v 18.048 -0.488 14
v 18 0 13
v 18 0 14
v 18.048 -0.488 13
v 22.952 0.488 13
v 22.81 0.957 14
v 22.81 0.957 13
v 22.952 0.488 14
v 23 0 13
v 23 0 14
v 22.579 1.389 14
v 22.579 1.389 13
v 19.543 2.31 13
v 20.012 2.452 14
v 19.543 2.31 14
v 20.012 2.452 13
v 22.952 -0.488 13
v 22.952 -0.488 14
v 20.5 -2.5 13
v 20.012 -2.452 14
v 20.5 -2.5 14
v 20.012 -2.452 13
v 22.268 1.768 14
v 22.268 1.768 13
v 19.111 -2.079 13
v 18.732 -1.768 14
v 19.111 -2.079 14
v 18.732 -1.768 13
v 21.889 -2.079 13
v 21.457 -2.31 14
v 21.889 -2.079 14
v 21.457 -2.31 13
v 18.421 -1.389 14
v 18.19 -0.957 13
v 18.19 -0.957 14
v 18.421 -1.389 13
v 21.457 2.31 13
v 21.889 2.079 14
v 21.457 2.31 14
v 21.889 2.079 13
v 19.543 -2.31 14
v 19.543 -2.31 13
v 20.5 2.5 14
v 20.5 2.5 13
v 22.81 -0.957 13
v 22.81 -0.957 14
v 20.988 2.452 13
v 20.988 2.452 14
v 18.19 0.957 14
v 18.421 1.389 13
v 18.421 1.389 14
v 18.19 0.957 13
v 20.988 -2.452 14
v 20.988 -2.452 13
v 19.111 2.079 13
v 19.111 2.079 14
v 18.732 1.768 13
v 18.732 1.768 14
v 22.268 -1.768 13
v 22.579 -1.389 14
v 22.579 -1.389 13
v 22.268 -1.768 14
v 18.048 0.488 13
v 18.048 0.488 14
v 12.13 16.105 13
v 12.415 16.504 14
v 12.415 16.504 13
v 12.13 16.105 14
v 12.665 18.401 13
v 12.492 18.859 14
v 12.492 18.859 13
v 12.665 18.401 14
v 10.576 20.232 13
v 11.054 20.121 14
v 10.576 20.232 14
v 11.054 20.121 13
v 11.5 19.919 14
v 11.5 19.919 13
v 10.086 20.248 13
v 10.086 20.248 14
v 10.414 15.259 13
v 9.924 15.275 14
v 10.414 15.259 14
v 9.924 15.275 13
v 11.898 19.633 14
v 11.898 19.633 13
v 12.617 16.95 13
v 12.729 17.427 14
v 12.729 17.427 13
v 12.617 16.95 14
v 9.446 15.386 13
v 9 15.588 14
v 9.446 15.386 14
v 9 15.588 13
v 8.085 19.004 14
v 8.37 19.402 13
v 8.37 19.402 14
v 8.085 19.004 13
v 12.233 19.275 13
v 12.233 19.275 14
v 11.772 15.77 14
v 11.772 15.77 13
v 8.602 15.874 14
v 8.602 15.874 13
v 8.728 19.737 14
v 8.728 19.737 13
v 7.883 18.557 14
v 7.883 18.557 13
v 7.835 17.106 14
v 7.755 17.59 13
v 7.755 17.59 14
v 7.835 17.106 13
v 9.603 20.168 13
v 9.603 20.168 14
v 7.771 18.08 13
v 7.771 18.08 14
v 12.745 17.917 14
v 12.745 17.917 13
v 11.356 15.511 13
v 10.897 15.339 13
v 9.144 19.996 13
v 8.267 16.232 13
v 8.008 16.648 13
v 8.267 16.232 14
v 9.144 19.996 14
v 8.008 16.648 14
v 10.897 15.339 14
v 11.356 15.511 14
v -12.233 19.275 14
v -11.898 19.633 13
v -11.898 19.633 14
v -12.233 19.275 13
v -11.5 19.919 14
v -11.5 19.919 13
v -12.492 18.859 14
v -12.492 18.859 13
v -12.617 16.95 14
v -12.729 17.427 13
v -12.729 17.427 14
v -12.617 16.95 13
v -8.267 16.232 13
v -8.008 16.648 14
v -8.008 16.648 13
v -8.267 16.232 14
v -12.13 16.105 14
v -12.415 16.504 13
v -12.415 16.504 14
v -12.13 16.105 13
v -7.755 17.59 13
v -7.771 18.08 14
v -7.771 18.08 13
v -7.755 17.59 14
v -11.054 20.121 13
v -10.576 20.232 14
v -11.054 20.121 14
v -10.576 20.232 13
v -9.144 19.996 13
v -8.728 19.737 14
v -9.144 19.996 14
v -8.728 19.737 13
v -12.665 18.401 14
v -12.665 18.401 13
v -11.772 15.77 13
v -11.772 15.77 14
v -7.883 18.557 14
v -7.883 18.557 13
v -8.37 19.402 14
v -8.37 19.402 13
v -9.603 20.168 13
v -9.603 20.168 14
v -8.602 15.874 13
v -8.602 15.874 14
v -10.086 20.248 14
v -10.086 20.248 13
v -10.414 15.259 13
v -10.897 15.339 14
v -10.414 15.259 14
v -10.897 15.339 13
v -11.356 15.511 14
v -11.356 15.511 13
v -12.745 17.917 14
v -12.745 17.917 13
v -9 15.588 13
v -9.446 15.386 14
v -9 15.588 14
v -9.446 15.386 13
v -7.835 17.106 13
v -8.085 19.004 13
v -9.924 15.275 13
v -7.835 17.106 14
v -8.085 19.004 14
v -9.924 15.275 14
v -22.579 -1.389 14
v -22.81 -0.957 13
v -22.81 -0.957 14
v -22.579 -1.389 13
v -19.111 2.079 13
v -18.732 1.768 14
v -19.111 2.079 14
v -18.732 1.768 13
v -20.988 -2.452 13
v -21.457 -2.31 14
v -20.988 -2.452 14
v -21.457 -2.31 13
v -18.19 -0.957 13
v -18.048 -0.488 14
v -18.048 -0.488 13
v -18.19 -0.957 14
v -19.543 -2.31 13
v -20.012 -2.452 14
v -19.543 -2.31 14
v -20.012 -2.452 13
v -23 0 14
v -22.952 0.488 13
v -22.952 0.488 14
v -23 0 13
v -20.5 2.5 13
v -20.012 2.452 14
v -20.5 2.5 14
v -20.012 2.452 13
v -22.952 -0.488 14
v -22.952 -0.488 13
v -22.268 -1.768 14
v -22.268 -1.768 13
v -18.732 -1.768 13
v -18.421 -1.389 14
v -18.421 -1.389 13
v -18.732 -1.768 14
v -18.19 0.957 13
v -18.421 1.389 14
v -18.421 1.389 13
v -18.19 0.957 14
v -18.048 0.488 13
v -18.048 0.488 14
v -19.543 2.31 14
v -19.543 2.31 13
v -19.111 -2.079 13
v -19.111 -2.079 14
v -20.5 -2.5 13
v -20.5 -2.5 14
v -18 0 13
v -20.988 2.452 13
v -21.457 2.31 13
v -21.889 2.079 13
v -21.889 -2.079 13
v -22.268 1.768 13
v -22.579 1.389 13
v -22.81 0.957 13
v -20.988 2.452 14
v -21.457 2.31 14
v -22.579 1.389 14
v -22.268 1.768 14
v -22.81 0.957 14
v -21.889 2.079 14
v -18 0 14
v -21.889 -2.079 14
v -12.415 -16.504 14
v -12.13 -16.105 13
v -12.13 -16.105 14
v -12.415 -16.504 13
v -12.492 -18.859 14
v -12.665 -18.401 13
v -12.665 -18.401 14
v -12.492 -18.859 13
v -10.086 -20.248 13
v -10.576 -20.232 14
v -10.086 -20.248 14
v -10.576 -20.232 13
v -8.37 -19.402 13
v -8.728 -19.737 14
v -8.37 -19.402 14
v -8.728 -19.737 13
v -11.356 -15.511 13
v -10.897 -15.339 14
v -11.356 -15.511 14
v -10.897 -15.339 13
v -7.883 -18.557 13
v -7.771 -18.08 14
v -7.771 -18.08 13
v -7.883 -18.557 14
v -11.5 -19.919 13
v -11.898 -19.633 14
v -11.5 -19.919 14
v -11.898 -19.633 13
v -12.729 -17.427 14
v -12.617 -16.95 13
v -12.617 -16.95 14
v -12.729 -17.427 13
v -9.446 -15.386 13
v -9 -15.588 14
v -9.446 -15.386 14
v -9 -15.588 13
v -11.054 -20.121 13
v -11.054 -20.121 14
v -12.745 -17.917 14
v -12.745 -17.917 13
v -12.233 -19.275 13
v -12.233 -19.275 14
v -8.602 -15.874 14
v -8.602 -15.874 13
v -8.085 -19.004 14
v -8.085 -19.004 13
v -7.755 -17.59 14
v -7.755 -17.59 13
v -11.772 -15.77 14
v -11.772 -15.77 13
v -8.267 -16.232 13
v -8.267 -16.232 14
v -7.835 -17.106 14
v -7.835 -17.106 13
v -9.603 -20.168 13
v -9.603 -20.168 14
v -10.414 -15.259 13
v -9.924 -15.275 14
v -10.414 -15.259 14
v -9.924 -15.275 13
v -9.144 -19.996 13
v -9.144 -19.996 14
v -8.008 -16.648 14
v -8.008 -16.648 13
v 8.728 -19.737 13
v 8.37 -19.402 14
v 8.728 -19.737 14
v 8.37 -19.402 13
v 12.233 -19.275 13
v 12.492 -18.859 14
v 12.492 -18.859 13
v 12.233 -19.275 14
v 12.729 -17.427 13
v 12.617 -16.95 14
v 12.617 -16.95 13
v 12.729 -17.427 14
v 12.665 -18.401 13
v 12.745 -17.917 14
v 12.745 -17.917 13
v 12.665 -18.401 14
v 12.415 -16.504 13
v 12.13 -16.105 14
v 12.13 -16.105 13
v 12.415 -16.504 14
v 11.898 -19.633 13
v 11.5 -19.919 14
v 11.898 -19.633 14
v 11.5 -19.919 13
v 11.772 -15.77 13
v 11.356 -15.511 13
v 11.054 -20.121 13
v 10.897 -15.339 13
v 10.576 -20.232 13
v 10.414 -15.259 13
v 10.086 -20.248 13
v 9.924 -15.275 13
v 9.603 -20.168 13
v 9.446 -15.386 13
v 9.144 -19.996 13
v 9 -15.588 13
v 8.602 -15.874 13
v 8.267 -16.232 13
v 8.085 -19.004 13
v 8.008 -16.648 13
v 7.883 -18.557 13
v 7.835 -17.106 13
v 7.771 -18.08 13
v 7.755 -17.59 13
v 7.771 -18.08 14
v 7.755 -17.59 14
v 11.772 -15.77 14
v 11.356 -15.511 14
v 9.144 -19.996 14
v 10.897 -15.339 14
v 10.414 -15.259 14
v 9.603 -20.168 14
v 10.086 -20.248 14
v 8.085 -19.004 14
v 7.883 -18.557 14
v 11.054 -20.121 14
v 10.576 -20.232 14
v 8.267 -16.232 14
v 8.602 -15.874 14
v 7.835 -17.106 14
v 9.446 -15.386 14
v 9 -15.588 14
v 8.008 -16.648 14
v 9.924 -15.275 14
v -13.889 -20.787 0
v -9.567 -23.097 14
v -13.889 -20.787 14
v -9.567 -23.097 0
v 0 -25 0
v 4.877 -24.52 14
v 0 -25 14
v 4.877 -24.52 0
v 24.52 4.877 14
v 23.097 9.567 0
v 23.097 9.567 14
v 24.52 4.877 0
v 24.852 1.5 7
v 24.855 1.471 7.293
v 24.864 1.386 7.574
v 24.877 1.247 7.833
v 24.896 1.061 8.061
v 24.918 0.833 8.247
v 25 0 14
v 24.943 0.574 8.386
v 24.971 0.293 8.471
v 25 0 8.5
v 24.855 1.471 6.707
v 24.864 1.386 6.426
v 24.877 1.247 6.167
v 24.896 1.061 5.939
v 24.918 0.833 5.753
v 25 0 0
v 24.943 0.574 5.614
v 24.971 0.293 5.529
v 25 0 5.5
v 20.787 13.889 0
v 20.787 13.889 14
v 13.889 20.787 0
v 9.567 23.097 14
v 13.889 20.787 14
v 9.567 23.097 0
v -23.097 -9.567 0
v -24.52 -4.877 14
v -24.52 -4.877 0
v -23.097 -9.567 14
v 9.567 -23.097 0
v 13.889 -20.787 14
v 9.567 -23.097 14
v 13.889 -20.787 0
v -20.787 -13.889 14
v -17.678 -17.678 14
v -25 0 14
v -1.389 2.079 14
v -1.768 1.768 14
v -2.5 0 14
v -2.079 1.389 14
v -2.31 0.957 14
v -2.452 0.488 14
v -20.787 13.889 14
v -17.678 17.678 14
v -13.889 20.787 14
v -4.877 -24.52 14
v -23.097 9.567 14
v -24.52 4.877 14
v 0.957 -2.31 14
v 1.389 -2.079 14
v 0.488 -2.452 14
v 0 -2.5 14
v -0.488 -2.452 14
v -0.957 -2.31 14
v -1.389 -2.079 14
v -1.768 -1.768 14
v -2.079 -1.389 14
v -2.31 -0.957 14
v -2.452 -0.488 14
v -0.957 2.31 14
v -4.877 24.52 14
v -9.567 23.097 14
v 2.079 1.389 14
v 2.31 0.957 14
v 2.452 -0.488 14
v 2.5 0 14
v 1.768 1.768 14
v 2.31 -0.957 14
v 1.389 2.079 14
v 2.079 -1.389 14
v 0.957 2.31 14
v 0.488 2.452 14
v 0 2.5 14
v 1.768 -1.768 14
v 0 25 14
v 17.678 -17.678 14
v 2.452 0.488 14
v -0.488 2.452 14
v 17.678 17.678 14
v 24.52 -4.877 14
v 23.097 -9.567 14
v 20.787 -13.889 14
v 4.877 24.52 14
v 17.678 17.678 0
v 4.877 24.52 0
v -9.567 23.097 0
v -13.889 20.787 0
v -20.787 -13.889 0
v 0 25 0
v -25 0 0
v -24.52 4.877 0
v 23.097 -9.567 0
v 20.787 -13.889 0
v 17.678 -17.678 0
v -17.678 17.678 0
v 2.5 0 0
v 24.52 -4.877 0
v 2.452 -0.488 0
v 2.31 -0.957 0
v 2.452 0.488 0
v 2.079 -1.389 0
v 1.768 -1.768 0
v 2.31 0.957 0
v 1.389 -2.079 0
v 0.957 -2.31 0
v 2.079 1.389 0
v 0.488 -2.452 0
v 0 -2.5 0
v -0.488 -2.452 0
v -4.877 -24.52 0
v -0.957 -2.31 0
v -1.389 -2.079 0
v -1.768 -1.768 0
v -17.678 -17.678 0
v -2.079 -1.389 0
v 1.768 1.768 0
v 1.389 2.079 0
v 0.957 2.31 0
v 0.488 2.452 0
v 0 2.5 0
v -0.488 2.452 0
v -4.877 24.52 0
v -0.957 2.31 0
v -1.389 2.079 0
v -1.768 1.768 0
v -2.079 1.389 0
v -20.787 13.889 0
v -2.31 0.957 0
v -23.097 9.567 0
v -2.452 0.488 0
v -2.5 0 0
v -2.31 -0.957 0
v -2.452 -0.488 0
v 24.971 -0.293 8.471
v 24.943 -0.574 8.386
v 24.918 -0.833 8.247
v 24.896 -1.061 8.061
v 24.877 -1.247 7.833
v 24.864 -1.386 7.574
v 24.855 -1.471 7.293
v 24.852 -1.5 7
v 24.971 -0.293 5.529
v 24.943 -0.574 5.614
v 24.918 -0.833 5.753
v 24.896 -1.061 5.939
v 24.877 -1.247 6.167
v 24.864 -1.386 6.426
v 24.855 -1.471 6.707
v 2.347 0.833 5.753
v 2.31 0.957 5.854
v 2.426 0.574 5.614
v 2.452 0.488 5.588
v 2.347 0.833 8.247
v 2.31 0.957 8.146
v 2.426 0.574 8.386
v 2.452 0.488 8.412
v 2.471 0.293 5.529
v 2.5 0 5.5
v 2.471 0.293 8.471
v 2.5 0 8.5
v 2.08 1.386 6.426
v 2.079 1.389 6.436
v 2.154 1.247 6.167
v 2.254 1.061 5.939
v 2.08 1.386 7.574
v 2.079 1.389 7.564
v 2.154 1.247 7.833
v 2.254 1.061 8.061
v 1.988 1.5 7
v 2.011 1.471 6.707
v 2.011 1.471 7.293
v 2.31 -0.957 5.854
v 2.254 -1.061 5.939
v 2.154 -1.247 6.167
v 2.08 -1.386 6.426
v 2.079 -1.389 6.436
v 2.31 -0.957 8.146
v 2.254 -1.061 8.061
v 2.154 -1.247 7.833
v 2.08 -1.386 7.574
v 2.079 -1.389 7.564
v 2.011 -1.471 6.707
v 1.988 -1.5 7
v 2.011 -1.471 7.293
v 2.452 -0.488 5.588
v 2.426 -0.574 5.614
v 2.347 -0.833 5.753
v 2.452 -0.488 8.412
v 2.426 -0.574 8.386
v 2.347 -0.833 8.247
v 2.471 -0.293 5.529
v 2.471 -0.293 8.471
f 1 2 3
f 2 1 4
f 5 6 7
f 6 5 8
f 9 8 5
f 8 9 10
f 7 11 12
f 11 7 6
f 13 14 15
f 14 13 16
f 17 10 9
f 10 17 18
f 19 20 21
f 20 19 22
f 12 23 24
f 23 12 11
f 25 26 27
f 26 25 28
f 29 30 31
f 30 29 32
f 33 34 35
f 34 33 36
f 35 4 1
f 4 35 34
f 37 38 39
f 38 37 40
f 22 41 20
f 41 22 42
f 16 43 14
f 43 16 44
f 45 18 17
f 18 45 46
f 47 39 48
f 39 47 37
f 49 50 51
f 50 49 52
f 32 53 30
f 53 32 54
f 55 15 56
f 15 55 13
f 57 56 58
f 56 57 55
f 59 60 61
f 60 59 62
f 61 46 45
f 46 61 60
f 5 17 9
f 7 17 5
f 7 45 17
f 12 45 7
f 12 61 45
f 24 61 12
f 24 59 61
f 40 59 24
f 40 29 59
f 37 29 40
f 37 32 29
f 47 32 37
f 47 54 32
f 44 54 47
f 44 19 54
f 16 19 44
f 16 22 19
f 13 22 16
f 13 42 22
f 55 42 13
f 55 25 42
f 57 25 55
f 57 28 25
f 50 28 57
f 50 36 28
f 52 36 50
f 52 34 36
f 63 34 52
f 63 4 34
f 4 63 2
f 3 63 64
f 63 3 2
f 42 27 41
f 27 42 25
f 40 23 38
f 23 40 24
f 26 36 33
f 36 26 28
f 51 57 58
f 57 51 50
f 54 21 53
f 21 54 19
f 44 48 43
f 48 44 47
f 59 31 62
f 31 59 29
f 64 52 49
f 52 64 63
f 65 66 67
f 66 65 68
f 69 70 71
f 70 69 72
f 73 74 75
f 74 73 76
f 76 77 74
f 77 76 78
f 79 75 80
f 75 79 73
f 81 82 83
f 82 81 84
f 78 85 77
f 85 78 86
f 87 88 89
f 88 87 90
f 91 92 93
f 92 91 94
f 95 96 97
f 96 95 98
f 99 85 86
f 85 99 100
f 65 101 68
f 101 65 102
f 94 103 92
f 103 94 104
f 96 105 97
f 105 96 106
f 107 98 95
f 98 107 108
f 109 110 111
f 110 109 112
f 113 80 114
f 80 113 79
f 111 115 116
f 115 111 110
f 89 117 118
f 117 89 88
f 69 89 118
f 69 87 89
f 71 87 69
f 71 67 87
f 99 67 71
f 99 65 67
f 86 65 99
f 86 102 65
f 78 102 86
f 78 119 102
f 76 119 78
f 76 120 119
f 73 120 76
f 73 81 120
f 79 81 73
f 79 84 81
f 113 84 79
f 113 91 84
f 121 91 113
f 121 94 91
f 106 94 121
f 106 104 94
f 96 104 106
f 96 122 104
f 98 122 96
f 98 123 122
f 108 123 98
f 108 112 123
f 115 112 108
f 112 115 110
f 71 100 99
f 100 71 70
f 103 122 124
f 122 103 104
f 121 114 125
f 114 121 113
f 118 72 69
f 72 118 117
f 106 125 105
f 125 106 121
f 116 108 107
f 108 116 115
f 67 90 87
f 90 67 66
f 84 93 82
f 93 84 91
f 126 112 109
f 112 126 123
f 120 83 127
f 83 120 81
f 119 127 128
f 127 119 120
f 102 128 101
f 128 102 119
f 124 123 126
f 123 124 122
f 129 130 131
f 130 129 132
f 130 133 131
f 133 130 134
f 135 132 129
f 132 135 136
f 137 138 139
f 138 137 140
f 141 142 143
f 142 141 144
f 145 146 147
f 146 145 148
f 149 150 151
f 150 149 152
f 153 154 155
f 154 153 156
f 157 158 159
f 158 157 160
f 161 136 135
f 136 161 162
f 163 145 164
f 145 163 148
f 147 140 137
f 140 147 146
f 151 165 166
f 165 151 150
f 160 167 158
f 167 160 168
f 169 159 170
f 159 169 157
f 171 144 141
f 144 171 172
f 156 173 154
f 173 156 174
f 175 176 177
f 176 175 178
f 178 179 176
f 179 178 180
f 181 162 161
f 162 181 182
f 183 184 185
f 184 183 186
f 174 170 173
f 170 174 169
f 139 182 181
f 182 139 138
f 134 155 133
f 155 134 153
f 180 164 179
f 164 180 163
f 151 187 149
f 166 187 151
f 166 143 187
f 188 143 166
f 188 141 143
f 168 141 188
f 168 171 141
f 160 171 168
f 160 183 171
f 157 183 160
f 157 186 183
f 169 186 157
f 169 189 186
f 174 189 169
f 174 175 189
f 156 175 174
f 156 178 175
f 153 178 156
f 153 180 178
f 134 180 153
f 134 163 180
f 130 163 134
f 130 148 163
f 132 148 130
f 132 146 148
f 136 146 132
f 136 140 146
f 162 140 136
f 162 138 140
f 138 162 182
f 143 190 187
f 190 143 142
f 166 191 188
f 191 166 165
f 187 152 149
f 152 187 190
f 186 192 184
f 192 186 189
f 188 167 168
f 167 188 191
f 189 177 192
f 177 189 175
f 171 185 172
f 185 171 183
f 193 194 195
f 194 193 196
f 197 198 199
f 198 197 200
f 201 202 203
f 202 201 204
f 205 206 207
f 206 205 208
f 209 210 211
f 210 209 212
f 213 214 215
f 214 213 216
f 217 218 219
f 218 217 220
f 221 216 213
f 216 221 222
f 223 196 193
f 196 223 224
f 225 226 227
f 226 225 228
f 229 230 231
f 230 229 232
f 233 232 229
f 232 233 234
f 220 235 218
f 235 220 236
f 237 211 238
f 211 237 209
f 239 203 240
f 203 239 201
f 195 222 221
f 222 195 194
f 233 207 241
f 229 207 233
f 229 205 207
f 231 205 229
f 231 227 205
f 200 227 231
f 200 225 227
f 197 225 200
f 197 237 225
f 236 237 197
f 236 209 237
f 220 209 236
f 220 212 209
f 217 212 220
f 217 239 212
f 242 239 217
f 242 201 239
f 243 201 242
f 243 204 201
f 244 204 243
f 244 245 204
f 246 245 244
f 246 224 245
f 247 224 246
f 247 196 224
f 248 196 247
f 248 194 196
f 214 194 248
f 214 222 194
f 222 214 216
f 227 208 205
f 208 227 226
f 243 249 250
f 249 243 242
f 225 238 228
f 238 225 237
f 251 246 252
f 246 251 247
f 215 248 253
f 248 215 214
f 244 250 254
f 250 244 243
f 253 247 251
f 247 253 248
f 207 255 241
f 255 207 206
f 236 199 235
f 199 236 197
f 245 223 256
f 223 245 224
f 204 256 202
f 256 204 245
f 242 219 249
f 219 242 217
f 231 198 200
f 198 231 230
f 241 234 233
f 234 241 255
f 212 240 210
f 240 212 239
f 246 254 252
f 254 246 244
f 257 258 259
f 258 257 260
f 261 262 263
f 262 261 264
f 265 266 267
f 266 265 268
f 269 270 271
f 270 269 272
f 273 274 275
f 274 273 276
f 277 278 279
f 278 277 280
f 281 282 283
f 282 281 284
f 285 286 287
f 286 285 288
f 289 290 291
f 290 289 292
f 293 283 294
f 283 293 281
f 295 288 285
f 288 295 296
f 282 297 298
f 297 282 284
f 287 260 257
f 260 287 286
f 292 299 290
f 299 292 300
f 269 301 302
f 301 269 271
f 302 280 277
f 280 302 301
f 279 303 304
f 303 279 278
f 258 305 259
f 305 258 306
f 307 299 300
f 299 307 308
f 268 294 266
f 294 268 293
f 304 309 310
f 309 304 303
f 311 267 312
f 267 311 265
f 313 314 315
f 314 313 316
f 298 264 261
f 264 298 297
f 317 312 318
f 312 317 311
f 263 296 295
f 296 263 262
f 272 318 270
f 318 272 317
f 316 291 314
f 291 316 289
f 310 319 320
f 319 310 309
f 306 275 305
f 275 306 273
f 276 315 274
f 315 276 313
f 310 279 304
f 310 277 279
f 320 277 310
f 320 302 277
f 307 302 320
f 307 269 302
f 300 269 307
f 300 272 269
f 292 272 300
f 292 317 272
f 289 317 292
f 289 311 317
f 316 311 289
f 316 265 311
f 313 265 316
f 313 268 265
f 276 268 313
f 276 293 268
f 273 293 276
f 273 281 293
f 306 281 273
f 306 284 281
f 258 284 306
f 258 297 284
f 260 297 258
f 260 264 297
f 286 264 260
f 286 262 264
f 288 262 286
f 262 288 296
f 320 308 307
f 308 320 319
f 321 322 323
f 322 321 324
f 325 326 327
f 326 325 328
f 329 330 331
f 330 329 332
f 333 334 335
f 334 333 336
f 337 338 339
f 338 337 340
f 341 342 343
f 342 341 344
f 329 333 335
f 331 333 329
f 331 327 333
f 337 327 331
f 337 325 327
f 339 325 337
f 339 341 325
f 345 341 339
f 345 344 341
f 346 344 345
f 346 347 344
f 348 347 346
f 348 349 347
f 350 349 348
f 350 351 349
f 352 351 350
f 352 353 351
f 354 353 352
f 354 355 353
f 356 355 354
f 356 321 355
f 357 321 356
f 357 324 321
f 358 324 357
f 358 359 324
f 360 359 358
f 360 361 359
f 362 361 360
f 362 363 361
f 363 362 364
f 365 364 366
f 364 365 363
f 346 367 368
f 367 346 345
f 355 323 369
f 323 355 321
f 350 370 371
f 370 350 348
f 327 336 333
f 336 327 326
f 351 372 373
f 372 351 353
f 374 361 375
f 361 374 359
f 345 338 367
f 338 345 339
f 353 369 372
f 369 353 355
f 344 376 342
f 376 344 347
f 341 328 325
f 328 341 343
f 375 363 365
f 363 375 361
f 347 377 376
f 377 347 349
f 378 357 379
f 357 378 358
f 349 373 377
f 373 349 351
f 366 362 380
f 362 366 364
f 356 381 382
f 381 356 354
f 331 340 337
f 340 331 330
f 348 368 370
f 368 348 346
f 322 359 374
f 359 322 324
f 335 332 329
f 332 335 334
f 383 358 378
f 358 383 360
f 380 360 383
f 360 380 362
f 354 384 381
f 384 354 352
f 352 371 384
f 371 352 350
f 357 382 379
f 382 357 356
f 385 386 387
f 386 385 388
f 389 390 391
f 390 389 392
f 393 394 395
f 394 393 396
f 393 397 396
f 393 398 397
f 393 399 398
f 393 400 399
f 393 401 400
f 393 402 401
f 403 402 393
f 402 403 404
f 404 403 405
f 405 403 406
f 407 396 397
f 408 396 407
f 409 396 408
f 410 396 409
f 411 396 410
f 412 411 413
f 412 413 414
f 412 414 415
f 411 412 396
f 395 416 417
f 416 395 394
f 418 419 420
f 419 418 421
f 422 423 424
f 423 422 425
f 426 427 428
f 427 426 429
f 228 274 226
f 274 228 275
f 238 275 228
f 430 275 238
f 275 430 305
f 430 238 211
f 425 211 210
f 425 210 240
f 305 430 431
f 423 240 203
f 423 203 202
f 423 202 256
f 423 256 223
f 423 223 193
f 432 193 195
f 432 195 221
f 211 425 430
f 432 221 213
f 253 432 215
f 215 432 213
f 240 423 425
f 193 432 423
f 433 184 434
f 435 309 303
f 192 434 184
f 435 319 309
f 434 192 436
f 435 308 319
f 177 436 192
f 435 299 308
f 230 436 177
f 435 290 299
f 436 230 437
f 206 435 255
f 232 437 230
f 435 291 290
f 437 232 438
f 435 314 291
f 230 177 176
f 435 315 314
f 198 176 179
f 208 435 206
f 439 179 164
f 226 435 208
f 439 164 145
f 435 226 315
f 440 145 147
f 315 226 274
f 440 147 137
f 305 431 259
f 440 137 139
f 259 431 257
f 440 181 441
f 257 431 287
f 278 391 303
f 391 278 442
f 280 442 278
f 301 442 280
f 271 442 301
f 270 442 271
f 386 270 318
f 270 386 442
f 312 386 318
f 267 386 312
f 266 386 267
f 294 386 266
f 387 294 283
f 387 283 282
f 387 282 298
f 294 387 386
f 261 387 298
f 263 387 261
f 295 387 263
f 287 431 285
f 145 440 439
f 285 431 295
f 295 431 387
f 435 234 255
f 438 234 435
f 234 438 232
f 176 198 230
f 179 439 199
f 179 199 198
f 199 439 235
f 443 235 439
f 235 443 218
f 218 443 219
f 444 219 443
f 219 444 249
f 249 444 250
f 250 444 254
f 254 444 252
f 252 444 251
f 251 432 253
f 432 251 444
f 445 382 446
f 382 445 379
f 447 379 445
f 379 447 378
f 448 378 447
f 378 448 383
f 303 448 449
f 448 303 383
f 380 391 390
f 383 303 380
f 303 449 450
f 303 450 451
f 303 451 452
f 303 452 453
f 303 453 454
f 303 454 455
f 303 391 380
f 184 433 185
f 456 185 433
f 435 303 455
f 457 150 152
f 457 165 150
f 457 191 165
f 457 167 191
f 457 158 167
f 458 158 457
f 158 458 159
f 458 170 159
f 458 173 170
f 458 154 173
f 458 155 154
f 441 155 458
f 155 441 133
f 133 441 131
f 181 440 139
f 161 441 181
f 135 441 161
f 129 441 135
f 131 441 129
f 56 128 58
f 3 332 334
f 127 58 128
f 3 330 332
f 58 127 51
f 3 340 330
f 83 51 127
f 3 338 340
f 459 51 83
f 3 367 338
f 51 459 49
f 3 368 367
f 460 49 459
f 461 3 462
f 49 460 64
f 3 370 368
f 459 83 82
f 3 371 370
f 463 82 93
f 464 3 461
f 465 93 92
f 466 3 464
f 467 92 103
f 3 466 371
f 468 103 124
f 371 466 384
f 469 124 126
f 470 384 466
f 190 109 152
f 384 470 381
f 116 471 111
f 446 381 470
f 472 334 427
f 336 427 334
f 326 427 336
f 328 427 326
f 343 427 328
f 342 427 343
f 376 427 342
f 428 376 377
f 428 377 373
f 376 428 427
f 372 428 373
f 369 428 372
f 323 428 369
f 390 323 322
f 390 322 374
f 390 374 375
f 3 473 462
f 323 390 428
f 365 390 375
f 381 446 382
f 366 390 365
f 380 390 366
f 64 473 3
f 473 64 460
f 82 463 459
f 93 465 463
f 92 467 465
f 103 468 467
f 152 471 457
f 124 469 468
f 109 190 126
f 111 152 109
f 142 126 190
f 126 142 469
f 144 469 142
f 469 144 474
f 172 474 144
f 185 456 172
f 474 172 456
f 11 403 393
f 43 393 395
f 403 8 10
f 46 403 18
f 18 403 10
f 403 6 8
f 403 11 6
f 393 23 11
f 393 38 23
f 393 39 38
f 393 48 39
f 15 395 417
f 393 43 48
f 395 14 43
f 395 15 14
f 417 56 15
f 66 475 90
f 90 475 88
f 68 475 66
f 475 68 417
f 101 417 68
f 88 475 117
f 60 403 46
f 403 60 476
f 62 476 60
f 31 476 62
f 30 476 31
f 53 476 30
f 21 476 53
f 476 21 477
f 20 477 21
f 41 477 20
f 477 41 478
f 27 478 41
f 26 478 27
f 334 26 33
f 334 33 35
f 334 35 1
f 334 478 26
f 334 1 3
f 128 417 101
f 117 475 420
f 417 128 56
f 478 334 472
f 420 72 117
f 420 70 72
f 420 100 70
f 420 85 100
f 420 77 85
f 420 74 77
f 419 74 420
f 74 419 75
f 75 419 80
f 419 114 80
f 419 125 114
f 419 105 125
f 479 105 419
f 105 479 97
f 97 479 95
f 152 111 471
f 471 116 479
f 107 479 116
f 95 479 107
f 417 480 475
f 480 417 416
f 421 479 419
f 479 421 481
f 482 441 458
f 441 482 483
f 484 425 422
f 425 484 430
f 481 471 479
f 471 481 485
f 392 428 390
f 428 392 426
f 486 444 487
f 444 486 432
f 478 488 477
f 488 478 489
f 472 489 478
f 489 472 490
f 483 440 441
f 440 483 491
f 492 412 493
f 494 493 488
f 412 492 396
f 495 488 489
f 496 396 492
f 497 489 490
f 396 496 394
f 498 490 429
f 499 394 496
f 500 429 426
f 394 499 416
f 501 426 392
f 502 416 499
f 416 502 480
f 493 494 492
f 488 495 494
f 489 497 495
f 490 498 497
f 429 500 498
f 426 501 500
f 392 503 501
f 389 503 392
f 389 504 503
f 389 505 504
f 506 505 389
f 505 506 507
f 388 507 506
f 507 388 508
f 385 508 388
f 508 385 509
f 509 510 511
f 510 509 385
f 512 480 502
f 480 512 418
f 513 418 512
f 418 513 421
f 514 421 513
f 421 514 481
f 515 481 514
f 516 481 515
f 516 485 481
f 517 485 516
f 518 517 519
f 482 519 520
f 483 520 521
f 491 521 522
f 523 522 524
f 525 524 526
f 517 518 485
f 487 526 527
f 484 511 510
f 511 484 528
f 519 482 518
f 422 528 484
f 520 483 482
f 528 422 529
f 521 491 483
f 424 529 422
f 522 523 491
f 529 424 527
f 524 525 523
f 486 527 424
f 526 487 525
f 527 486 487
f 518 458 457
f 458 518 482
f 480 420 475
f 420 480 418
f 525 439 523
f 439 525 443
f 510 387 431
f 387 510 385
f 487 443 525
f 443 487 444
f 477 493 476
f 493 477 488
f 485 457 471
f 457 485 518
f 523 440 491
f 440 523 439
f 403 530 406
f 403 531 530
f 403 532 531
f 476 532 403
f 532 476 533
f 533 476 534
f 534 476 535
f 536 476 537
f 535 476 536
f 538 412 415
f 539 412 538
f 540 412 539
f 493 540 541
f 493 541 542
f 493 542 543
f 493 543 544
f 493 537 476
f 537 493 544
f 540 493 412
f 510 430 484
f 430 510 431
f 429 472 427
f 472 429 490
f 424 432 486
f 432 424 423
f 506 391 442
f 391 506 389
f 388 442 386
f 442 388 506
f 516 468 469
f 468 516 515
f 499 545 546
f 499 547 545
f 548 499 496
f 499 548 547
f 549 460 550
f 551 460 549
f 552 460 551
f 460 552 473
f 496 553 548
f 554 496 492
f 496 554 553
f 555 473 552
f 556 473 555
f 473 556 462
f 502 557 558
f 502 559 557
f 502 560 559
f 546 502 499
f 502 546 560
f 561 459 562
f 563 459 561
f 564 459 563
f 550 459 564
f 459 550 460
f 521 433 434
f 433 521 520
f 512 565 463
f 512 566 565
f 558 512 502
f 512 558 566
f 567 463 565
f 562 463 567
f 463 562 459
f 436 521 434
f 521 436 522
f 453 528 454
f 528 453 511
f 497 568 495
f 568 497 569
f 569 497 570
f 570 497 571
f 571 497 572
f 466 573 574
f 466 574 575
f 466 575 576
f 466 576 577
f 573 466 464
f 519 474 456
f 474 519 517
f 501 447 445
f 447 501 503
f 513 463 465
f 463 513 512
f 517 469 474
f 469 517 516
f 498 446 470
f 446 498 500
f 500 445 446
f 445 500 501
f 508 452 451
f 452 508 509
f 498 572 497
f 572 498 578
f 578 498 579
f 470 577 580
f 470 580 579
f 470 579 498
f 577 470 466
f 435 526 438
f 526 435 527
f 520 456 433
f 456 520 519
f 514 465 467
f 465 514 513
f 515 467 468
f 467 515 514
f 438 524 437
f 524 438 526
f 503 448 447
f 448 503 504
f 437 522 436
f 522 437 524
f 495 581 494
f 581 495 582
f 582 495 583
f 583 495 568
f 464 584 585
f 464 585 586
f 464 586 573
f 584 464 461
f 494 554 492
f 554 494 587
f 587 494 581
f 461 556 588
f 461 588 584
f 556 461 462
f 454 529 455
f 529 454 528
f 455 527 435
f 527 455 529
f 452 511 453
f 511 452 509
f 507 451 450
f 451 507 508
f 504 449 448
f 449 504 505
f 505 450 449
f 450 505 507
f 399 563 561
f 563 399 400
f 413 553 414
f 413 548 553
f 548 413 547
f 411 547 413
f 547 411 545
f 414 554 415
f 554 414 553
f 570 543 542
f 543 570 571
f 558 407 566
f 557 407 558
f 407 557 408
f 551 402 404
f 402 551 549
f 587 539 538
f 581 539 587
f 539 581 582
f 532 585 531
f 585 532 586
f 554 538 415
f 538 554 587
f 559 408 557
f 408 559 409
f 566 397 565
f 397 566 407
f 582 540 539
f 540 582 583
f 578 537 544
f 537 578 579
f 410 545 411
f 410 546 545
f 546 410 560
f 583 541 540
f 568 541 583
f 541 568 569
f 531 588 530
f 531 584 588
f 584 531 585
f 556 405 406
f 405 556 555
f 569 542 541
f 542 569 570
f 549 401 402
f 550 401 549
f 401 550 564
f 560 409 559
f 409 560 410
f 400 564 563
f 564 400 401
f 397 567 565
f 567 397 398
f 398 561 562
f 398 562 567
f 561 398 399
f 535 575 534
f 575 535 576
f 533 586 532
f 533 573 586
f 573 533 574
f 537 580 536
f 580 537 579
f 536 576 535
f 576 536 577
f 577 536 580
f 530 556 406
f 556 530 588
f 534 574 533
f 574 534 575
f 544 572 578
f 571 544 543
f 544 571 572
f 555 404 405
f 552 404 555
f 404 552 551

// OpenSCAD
$fn = 32;

// ----------------------------------------------------------------------
// Control knob: dimpled knob
// ----------------------------------------------------------------------

// --- parameters (mm) ---
dimp_d = 5;               // finger dimple diameter
n_dimp = 6;               // number of dimples
dimp_r = 20.5;            // dimple ring radius
knob_d = 50;              // knob body diameter
knob_h = 14;              // knob body height
bore_d = 5;               // shaft bore diameter
set_d = 3;                // set screw bore diameter

dimp_step = 360 / n_dimp;  // dimple angular step

difference() {
  cylinder(h = knob_h, d = knob_d);
  translate([0, 0, -1]) cylinder(h = knob_h + 2, d = bore_d);
  translate([-1, 0, knob_h / 2]) rotate([0, 90, 0])
    cylinder(h = knob_d / 2 + bore_d / 2 + 2, d = set_d);  for (i = [0 : n_dimp - 1])
    rotate([0, 0, i * dimp_step])
      translate([dimp_r, 0, knob_h - 1])
        cylinder(h = 2, d = dimp_d);
}
